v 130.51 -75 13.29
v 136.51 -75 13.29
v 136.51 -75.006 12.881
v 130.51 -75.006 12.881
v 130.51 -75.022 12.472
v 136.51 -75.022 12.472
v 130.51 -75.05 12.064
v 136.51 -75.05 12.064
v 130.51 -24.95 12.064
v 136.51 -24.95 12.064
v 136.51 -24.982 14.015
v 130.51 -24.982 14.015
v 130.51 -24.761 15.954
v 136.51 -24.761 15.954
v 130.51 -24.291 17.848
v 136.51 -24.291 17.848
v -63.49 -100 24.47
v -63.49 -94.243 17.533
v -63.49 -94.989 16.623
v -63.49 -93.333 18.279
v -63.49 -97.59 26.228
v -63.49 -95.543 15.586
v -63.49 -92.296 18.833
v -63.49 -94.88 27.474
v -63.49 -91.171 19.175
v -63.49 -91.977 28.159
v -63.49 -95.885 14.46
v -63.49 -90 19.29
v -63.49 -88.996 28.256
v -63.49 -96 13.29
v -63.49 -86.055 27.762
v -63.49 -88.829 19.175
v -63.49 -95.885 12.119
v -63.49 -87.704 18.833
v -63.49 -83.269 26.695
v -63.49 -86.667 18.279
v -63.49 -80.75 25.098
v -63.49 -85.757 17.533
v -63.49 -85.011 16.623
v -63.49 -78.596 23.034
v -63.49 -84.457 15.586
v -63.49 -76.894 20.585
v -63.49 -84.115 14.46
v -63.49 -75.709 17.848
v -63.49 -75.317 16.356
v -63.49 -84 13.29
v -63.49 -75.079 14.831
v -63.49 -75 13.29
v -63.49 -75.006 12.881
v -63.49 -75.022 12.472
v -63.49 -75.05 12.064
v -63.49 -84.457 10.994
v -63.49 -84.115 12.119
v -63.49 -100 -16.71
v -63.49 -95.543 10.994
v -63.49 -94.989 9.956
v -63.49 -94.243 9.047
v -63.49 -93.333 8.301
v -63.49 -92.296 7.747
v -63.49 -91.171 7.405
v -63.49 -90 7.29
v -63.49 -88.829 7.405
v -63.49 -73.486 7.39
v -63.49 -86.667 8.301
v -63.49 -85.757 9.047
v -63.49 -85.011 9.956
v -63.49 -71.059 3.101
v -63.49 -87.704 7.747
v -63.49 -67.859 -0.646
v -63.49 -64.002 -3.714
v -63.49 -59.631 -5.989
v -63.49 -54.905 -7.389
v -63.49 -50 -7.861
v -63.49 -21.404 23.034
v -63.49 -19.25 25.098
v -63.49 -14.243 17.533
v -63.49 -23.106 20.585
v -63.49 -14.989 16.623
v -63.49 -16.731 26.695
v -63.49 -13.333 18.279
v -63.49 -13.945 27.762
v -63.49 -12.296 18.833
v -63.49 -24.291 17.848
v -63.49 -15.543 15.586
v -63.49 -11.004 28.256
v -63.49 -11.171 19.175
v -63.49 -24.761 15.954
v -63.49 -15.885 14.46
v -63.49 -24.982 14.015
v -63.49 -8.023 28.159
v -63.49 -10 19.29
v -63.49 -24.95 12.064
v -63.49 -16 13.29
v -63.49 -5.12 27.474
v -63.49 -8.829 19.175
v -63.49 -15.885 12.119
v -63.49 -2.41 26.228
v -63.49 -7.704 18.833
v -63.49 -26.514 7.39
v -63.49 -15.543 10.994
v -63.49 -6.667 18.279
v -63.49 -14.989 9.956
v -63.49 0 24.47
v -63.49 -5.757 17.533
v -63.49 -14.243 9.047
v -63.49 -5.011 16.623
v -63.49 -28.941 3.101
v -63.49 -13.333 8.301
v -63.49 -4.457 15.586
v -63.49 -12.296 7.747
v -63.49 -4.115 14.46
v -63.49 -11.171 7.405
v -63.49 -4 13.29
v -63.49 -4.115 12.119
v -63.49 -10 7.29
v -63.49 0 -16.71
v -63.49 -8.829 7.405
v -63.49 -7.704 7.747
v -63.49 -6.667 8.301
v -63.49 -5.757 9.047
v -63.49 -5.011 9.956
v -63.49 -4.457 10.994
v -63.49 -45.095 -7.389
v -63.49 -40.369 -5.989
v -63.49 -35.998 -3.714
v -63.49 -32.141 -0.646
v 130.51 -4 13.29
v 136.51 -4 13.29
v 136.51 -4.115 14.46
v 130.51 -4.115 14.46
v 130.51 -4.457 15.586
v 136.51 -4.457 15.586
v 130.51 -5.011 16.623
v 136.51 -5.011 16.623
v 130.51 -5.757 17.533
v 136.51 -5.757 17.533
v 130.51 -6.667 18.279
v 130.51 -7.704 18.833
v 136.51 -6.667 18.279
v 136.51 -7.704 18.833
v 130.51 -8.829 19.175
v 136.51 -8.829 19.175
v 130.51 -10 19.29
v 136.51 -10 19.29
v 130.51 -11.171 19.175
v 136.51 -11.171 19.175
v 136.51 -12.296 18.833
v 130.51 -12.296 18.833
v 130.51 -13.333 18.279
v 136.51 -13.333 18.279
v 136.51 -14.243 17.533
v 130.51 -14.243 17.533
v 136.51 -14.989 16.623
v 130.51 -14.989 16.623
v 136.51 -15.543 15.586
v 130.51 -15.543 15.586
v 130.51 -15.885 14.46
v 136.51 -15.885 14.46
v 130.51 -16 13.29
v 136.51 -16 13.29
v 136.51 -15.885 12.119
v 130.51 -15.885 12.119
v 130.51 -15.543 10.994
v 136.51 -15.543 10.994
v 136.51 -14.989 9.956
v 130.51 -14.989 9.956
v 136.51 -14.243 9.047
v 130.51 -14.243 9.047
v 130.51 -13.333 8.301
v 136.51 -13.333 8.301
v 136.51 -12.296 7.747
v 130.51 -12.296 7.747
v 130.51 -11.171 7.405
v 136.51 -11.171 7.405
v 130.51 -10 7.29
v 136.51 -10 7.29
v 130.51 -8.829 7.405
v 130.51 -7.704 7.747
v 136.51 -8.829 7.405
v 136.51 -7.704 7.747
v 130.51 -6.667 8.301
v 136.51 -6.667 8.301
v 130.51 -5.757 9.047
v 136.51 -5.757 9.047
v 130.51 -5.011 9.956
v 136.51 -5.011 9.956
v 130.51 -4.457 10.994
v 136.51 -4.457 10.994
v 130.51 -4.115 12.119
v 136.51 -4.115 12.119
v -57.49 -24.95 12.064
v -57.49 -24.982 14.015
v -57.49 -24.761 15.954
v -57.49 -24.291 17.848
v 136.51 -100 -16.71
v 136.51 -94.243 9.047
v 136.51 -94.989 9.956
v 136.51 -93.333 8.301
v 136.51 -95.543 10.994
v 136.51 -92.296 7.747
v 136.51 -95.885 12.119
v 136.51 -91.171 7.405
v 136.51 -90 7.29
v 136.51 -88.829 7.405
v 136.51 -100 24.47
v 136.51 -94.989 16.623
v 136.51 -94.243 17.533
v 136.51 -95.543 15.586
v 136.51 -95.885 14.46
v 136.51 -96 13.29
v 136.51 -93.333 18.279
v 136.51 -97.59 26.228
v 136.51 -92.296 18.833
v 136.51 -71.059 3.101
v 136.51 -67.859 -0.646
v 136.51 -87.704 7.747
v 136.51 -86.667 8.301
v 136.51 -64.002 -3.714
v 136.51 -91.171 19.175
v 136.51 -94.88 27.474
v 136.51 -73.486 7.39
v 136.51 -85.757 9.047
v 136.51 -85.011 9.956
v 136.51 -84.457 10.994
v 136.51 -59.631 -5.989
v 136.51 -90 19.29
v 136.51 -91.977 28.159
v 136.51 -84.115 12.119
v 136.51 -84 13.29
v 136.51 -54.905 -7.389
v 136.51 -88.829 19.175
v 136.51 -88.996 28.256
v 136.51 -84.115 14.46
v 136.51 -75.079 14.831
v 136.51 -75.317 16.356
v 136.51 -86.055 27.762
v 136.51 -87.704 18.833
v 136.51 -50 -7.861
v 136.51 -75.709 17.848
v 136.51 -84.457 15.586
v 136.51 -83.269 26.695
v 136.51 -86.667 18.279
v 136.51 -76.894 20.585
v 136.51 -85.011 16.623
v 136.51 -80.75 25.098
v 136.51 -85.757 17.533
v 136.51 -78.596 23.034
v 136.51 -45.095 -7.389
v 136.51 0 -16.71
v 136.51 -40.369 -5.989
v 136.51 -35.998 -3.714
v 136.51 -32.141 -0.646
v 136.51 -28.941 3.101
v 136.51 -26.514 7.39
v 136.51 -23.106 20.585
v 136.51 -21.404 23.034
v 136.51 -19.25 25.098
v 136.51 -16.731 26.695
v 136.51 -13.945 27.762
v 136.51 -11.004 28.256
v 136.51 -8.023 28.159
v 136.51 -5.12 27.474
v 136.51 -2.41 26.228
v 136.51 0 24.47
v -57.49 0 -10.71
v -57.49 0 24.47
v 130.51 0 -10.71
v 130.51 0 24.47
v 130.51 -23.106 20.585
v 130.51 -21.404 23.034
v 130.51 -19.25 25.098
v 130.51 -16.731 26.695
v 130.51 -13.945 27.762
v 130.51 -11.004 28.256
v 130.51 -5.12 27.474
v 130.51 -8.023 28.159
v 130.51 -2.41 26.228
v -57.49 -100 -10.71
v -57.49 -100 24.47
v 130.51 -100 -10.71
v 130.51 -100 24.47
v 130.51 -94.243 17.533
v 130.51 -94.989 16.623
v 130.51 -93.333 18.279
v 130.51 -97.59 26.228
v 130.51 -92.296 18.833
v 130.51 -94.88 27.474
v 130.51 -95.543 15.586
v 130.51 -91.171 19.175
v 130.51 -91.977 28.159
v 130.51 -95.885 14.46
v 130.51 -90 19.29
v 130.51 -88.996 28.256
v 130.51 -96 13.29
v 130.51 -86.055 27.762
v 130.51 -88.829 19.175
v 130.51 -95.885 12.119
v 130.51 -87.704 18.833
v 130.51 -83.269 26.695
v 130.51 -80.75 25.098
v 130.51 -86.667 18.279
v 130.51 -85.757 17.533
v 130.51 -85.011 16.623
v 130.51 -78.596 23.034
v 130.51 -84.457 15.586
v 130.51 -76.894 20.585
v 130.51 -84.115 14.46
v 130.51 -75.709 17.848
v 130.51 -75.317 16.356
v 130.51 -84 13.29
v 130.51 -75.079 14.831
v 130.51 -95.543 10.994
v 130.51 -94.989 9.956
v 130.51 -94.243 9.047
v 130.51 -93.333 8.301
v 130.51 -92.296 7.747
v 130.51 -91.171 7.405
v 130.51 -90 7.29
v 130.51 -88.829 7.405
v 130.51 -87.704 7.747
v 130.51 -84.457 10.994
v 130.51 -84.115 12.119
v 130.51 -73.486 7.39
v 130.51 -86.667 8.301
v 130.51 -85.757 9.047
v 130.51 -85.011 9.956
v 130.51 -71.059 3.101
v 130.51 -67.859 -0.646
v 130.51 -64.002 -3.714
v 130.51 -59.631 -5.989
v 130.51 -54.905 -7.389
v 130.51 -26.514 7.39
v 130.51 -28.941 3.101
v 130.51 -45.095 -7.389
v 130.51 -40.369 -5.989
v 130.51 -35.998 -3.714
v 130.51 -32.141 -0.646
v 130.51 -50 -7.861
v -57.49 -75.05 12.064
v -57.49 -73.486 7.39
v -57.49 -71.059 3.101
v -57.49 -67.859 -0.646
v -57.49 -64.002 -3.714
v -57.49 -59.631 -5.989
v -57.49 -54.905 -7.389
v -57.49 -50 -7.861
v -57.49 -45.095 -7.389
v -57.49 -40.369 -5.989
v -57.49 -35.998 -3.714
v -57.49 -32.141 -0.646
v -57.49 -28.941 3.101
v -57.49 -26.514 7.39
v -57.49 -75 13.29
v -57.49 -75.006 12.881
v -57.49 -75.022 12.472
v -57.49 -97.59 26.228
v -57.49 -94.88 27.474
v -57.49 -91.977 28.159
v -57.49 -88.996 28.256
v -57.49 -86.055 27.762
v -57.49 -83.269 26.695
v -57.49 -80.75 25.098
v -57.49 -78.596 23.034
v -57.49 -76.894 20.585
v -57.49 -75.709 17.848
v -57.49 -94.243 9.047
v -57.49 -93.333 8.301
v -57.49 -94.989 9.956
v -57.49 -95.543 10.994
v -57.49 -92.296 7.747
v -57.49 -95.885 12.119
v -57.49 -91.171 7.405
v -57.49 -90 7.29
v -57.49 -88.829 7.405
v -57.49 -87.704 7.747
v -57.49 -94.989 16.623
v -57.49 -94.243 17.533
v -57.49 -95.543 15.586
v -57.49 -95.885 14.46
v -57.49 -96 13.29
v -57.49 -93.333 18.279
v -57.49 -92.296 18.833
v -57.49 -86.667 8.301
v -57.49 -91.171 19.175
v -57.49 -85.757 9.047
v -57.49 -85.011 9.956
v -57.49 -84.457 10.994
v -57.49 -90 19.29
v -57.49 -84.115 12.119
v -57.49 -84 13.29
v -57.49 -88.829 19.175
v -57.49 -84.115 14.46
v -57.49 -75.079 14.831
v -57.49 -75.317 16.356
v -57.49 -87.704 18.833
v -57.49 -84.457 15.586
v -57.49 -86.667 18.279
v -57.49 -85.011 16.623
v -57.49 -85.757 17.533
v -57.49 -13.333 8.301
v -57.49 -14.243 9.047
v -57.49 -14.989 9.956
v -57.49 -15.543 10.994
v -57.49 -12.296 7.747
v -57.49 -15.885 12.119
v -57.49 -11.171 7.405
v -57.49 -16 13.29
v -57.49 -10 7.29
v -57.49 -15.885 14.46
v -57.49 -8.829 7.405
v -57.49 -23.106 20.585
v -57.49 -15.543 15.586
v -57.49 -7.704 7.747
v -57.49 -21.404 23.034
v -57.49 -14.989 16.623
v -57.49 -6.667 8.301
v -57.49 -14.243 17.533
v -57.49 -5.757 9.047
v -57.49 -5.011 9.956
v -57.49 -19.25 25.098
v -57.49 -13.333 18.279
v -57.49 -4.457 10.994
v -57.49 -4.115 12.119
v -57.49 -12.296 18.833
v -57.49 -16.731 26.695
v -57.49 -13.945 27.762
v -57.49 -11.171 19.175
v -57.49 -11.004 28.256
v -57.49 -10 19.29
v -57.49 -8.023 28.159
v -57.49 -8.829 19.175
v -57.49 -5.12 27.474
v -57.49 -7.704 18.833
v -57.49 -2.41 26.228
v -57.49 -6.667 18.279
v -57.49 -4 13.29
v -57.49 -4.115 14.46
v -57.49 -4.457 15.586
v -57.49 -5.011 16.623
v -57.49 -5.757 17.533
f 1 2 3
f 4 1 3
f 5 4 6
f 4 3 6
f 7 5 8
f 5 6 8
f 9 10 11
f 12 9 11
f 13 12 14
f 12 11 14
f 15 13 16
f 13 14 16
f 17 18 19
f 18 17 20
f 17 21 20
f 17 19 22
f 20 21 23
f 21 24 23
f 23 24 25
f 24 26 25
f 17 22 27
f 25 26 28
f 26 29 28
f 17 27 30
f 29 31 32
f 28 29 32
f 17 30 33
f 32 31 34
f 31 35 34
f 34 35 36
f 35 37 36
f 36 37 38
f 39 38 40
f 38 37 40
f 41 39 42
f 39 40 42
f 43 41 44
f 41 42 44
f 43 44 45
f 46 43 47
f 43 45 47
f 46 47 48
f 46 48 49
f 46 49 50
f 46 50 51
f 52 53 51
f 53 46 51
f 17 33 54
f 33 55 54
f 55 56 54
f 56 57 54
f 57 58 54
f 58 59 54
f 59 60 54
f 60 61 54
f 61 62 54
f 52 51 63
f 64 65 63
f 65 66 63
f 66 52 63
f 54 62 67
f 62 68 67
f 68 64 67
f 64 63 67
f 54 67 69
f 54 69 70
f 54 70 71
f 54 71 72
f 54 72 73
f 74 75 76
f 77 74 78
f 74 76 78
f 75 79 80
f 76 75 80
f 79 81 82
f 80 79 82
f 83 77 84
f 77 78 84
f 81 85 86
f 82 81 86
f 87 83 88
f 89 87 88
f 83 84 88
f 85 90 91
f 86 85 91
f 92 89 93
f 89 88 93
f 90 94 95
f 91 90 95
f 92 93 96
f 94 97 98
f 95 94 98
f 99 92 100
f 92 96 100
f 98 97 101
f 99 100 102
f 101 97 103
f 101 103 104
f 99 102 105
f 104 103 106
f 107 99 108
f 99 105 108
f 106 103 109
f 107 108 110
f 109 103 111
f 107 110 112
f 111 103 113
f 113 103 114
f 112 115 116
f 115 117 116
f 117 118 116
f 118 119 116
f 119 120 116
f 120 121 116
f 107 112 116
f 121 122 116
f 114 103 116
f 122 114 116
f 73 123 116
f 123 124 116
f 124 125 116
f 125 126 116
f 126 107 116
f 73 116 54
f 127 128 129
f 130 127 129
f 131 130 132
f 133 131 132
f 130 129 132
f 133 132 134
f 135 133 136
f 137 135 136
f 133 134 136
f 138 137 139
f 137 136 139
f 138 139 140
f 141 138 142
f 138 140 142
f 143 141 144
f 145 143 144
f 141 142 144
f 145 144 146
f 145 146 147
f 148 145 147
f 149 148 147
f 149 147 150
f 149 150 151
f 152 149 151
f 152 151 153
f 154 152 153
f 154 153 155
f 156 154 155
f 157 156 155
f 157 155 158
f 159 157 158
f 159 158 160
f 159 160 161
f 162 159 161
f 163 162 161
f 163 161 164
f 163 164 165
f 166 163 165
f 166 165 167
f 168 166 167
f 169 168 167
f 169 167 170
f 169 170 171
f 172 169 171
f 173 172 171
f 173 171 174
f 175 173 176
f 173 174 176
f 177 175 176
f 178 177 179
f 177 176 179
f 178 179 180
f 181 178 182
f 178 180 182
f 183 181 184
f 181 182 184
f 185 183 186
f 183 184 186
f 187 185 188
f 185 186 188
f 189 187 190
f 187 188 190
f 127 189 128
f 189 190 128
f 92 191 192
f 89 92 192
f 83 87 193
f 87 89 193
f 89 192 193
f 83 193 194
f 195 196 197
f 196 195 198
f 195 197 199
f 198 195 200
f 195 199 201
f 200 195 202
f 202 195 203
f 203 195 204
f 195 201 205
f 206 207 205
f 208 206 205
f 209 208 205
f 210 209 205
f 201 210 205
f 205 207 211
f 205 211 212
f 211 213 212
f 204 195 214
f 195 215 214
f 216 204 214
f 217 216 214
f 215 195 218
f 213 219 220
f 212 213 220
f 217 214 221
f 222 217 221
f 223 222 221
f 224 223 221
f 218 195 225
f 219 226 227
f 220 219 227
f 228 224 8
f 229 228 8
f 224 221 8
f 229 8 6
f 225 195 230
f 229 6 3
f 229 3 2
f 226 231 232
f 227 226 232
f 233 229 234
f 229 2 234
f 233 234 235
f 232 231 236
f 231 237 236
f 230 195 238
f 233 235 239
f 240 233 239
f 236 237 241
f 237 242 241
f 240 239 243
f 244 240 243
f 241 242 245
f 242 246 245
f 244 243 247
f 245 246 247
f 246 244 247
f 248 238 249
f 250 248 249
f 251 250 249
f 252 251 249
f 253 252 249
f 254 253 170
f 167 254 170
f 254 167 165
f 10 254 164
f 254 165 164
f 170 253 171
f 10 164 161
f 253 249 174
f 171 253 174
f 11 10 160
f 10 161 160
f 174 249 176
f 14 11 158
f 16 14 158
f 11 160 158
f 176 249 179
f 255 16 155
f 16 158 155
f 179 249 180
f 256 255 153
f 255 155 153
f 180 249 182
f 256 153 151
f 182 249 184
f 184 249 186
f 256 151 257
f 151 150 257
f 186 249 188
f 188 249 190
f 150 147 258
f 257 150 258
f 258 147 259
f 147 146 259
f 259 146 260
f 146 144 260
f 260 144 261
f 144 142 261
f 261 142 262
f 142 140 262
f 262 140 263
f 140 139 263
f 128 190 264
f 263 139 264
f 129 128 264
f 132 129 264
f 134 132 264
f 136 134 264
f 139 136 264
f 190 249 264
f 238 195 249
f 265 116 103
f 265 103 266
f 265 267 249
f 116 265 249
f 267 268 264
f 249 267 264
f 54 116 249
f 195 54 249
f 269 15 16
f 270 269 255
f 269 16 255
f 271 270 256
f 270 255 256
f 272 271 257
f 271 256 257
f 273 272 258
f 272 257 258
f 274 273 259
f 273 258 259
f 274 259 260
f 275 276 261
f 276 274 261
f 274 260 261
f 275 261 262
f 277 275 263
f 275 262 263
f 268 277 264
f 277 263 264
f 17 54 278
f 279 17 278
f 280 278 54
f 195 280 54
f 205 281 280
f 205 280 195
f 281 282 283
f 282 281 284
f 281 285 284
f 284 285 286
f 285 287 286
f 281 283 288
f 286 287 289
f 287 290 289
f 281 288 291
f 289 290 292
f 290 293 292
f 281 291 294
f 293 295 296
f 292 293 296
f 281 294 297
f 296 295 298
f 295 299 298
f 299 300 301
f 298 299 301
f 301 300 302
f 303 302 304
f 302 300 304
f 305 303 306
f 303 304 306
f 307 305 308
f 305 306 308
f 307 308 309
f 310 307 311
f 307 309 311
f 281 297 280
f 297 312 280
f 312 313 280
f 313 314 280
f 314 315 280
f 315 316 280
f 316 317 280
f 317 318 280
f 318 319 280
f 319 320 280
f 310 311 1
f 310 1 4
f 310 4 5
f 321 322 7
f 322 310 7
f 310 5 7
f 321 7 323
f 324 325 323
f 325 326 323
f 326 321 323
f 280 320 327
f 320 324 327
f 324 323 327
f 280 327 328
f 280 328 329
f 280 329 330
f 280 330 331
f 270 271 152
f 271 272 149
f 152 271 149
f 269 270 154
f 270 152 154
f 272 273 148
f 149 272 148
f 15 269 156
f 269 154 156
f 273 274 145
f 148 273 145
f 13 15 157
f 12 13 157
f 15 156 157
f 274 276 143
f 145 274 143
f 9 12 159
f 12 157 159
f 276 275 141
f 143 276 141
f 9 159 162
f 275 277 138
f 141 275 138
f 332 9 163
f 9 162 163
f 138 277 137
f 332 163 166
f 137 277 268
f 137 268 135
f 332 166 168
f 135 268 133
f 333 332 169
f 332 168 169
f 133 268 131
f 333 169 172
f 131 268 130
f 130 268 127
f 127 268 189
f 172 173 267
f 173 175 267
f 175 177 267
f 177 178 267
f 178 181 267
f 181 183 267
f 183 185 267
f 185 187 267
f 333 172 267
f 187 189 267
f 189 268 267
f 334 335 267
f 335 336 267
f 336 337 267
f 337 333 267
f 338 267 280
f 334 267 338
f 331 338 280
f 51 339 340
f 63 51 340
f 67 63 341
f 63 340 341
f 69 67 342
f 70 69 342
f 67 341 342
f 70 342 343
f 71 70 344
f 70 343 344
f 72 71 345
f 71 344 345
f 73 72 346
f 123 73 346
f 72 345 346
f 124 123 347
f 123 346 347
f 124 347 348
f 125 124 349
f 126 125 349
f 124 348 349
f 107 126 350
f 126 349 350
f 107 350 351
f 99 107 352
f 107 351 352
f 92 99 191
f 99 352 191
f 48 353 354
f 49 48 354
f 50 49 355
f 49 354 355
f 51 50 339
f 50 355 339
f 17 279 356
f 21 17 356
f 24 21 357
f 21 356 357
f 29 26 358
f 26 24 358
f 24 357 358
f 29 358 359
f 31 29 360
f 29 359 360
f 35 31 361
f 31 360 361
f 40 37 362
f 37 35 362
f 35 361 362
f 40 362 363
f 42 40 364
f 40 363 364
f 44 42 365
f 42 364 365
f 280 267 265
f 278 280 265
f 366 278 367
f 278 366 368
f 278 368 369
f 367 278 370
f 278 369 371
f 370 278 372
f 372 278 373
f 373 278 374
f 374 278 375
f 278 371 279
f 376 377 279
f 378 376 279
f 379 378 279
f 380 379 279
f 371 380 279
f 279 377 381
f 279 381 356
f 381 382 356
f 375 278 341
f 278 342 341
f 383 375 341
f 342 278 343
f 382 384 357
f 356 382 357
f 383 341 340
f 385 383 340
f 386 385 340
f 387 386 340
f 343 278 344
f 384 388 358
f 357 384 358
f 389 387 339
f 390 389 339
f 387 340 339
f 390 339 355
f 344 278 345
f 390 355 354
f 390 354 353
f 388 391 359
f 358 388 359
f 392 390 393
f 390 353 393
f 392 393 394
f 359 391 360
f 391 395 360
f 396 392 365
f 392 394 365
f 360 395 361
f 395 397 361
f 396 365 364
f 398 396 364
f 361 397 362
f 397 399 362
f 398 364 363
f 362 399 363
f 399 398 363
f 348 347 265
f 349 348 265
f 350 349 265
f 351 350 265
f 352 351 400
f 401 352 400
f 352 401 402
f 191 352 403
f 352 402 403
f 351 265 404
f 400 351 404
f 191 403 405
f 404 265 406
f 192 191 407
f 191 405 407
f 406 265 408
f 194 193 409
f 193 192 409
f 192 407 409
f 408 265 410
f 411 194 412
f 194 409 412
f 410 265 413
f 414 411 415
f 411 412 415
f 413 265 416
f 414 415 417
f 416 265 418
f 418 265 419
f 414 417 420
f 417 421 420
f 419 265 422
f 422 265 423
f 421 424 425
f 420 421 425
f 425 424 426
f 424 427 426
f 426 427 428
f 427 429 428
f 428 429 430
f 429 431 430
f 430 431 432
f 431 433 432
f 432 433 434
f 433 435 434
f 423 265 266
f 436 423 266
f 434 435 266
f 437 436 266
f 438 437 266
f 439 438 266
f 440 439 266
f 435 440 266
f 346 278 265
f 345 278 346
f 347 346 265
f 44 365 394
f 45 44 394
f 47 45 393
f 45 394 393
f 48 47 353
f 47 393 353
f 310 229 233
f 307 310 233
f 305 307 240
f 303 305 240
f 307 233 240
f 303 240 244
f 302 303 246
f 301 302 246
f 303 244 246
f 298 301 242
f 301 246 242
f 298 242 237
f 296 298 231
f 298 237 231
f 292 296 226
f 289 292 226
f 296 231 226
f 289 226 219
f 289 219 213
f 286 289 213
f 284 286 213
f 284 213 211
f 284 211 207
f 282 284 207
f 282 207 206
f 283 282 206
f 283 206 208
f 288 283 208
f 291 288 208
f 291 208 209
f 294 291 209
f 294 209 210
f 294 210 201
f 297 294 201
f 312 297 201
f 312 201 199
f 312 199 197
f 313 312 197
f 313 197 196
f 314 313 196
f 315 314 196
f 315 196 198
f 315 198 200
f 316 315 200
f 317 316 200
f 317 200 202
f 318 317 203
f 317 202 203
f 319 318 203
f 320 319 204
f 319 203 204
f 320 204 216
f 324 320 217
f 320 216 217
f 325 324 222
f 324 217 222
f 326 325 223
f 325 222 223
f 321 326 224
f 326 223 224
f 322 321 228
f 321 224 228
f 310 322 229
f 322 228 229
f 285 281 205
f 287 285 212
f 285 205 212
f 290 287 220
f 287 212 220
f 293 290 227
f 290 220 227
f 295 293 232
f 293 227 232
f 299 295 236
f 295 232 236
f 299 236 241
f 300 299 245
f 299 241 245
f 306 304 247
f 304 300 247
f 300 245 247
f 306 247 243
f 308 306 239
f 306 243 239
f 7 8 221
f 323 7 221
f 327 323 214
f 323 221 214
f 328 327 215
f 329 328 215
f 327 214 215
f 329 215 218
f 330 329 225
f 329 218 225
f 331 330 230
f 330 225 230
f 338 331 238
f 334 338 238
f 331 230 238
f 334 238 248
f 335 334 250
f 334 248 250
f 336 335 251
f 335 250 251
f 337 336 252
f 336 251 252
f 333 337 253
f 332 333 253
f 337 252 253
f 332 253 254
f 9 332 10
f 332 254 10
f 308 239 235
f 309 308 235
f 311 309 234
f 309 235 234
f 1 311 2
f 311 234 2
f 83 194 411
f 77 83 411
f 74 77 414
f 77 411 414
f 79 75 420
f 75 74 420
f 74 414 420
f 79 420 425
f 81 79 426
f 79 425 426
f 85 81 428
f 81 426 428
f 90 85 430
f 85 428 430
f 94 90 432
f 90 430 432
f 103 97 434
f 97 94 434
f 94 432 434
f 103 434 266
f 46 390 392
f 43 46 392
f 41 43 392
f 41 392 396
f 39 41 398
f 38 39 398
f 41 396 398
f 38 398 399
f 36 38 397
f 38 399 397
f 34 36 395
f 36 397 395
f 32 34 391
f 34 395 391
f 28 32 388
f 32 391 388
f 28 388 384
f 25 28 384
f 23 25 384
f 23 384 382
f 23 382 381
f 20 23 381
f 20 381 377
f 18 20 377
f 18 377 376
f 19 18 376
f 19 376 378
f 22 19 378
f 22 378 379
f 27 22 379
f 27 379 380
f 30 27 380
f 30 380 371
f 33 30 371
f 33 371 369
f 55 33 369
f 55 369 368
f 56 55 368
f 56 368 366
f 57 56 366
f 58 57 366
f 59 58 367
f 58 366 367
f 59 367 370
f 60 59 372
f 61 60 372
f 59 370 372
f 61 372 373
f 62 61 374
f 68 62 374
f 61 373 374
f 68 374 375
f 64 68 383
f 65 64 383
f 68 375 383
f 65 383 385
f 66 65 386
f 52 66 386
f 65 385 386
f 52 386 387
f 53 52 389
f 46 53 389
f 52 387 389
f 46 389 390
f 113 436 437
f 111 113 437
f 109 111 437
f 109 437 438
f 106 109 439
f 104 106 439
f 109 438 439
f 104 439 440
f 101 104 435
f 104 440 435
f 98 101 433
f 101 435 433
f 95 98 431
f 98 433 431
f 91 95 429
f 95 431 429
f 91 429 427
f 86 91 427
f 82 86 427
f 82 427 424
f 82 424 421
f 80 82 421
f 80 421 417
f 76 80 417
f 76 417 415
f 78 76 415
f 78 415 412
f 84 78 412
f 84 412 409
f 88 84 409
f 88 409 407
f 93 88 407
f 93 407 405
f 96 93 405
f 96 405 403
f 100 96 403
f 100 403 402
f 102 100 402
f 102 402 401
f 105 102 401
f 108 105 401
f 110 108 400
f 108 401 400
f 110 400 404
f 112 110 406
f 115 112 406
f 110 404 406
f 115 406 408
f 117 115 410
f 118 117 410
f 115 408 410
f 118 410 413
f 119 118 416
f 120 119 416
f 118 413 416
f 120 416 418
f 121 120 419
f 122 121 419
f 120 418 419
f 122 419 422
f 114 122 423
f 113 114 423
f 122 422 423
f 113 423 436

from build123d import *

# Parameters (mm, degrees)
F1_DEPTH = 100
F2_R     = 6
F3_DEPTH = 200.001
F5_DEPTH = 200.001


with BuildPart() as f1:
    # F0 (on Front) → F1 (new body)
    with BuildSketch(Plane.XZ):
        Polygon((-57.490264, 33.289867), (-63.490264, 33.289867), (-63.490264, -16.710133), (136.509736, -16.710133), (136.509736, 33.289867), (130.509736, 33.289867), (130.509736, -10.710133), (-57.490264, -10.710133), align=None)
    extrude(amount=F1_DEPTH)

    # F2 (on face) → F3 (cut, through all)
    with BuildSketch(Plane.YZ.offset(136.509736)):
        with Locations((-90, 13.289867)):
            Circle(F2_R)
        with Locations((-10, 13.289867)):
            Circle(F2_R)
    extrude(amount=-F3_DEPTH, mode=Mode.SUBTRACT)

    # F4 (on face) → F5 (cut, through all)
    with BuildSketch(Plane.YZ.offset(136.509736)):
        with BuildLine():
            ThreePointArc((-75.70933, 17.848019), (-75.178393, 15.596374), (-75, 13.289867))
            ThreePointArc((-75, 13.289867), (-75.012554, 12.676309), (-75.050194, 12.063778))
            ThreePointArc((-75.050194, 12.063778), (-50, -7.861311), (-24.949806, 12.063778))
            ThreePointArc((-24.949806, 12.063778), (-24.903547, 14.988183), (-24.29067, 17.848019))
            ThreePointArc((-24.29067, 17.848019), (-13.945352, 27.761709), (0, 24.470207))
            Line((0, 24.470207), (0, 33.289867))
            Line((0, 33.289867), (-100, 33.289867))
            Line((-100, 33.289867), (-100, 24.470207))
            ThreePointArc((-100, 24.470207), (-86.054648, 27.761709), (-75.70933, 17.848019))
        make_face()
    extrude(amount=-F5_DEPTH, mode=Mode.SUBTRACT)


solid = f1.part
